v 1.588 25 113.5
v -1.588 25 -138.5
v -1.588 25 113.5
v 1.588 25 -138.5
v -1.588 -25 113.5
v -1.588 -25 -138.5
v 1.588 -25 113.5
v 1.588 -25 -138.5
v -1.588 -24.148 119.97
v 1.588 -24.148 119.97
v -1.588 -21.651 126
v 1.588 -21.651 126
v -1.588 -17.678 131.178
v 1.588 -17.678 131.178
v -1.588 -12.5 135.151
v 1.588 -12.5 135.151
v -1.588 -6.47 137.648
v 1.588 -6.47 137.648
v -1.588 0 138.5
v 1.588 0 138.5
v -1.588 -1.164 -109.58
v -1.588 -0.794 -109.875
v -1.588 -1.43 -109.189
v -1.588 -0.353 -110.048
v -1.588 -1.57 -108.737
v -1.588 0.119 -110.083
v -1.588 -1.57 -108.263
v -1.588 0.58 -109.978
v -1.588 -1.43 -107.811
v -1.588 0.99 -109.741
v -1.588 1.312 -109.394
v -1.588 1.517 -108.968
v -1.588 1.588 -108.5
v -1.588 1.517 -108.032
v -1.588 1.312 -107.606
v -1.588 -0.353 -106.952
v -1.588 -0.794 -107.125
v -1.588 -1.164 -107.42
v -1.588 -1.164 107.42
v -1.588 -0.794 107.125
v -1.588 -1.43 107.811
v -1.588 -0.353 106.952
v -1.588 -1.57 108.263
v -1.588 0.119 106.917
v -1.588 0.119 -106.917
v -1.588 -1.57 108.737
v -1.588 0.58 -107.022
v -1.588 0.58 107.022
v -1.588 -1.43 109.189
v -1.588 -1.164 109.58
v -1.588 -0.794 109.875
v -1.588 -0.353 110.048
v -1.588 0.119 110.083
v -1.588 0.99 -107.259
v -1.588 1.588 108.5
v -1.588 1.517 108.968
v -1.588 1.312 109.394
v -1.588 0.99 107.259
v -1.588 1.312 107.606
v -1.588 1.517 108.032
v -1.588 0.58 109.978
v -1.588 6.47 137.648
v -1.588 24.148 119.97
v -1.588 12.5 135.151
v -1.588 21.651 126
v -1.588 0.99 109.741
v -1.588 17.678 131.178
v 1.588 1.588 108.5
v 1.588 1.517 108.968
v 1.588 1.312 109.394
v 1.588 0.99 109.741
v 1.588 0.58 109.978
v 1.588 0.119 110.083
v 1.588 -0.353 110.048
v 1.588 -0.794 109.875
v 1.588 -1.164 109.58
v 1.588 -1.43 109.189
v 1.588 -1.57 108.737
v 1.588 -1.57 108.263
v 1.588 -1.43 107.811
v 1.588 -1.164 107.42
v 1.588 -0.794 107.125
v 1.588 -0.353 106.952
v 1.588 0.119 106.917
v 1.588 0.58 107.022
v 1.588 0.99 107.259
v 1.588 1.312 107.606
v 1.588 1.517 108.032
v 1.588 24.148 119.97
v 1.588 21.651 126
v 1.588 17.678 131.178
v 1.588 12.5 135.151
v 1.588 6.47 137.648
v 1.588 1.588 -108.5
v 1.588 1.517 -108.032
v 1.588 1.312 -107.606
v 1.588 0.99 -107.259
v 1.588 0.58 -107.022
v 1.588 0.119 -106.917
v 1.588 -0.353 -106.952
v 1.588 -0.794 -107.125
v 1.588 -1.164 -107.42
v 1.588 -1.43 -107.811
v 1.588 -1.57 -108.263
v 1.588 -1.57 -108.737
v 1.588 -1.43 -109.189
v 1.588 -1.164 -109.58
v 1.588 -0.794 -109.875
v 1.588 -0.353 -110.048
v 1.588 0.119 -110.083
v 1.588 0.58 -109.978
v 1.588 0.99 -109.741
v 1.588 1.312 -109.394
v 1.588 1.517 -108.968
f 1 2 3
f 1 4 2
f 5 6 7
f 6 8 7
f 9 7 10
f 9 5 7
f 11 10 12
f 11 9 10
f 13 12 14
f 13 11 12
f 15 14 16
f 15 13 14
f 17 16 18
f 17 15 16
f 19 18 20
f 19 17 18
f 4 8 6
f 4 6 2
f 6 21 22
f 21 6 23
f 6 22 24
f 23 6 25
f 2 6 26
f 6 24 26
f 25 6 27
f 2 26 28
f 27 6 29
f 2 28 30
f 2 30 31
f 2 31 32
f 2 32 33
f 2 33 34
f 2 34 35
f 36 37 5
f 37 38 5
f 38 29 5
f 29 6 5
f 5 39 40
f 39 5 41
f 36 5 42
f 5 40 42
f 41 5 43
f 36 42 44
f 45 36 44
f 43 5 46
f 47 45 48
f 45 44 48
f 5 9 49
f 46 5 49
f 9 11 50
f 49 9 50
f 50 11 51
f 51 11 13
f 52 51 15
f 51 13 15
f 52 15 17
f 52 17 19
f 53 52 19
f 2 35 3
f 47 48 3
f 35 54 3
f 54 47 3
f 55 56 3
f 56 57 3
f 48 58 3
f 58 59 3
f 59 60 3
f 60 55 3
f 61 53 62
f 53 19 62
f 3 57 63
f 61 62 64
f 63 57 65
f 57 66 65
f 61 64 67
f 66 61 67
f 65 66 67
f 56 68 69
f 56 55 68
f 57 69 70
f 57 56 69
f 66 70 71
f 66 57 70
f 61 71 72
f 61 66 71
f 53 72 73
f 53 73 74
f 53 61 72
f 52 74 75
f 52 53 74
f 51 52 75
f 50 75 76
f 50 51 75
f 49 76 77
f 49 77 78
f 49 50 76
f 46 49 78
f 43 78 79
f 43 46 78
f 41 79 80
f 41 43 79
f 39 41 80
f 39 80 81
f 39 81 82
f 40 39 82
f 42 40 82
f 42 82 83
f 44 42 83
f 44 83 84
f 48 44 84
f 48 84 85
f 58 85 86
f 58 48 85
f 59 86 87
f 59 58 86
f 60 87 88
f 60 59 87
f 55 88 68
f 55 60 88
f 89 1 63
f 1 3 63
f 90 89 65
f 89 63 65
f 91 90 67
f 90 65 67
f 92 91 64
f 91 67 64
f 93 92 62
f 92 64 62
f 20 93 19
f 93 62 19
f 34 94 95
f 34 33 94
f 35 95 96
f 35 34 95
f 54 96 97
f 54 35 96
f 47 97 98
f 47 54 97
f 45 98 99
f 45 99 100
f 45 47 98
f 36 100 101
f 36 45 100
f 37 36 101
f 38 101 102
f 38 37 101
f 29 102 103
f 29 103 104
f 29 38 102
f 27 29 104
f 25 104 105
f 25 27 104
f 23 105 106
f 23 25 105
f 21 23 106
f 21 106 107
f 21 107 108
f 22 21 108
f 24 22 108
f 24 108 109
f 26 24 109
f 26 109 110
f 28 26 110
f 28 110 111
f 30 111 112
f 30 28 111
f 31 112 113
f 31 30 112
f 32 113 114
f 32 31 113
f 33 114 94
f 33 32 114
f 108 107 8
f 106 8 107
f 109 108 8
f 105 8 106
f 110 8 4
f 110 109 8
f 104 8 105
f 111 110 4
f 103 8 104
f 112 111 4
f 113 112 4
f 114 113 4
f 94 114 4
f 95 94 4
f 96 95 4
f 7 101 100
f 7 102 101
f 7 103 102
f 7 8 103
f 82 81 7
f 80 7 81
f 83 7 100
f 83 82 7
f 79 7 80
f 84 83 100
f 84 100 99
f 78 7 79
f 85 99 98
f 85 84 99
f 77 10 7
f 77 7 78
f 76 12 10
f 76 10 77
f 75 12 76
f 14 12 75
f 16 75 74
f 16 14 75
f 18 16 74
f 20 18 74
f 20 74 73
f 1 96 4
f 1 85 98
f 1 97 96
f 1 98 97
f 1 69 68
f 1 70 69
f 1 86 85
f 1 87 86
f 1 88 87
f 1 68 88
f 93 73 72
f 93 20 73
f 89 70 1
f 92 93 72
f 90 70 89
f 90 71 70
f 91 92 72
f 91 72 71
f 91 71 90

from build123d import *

# Parameters (mm, degrees)
F1_W     = 50
F1_H     = 277
F1_R     = 1.5875
F2_DEPTH = 1.5875
F3_R     = 24.99999


# Not quite as in the source:
# - a fillet or chamfer is up to 0.001 mm smaller than in the source, because OpenCascade refuses the exact size
# - a length typed as a fraction of an inch, garbled in the dataset ("3 / 203.2 mm" for 3/8 in), is restored


with BuildPart() as f2:
    # F1 (on Right) → F2 (new body, symmetric)
    with BuildSketch(Plane.YZ):
        Rectangle(F1_W, F1_H)
        with Locations((0, -108.5)):
            Circle(F1_R, mode=Mode.SUBTRACT)
        with Locations((0, 108.5)):
            Circle(F1_R, mode=Mode.SUBTRACT)
    extrude(amount=F2_DEPTH, both=True)

    # F3 (radius 25 in the source; OpenCascade refuses exactly that, so slightly less here)
    f3_edges = [f2.edges().sort_by_distance(p)[0] for p in [
        (0, -25, 138.5),
        (0, 25, 138.5),
    ]]
    fillet(f3_edges, radius=F3_R)


solid = f2.part
